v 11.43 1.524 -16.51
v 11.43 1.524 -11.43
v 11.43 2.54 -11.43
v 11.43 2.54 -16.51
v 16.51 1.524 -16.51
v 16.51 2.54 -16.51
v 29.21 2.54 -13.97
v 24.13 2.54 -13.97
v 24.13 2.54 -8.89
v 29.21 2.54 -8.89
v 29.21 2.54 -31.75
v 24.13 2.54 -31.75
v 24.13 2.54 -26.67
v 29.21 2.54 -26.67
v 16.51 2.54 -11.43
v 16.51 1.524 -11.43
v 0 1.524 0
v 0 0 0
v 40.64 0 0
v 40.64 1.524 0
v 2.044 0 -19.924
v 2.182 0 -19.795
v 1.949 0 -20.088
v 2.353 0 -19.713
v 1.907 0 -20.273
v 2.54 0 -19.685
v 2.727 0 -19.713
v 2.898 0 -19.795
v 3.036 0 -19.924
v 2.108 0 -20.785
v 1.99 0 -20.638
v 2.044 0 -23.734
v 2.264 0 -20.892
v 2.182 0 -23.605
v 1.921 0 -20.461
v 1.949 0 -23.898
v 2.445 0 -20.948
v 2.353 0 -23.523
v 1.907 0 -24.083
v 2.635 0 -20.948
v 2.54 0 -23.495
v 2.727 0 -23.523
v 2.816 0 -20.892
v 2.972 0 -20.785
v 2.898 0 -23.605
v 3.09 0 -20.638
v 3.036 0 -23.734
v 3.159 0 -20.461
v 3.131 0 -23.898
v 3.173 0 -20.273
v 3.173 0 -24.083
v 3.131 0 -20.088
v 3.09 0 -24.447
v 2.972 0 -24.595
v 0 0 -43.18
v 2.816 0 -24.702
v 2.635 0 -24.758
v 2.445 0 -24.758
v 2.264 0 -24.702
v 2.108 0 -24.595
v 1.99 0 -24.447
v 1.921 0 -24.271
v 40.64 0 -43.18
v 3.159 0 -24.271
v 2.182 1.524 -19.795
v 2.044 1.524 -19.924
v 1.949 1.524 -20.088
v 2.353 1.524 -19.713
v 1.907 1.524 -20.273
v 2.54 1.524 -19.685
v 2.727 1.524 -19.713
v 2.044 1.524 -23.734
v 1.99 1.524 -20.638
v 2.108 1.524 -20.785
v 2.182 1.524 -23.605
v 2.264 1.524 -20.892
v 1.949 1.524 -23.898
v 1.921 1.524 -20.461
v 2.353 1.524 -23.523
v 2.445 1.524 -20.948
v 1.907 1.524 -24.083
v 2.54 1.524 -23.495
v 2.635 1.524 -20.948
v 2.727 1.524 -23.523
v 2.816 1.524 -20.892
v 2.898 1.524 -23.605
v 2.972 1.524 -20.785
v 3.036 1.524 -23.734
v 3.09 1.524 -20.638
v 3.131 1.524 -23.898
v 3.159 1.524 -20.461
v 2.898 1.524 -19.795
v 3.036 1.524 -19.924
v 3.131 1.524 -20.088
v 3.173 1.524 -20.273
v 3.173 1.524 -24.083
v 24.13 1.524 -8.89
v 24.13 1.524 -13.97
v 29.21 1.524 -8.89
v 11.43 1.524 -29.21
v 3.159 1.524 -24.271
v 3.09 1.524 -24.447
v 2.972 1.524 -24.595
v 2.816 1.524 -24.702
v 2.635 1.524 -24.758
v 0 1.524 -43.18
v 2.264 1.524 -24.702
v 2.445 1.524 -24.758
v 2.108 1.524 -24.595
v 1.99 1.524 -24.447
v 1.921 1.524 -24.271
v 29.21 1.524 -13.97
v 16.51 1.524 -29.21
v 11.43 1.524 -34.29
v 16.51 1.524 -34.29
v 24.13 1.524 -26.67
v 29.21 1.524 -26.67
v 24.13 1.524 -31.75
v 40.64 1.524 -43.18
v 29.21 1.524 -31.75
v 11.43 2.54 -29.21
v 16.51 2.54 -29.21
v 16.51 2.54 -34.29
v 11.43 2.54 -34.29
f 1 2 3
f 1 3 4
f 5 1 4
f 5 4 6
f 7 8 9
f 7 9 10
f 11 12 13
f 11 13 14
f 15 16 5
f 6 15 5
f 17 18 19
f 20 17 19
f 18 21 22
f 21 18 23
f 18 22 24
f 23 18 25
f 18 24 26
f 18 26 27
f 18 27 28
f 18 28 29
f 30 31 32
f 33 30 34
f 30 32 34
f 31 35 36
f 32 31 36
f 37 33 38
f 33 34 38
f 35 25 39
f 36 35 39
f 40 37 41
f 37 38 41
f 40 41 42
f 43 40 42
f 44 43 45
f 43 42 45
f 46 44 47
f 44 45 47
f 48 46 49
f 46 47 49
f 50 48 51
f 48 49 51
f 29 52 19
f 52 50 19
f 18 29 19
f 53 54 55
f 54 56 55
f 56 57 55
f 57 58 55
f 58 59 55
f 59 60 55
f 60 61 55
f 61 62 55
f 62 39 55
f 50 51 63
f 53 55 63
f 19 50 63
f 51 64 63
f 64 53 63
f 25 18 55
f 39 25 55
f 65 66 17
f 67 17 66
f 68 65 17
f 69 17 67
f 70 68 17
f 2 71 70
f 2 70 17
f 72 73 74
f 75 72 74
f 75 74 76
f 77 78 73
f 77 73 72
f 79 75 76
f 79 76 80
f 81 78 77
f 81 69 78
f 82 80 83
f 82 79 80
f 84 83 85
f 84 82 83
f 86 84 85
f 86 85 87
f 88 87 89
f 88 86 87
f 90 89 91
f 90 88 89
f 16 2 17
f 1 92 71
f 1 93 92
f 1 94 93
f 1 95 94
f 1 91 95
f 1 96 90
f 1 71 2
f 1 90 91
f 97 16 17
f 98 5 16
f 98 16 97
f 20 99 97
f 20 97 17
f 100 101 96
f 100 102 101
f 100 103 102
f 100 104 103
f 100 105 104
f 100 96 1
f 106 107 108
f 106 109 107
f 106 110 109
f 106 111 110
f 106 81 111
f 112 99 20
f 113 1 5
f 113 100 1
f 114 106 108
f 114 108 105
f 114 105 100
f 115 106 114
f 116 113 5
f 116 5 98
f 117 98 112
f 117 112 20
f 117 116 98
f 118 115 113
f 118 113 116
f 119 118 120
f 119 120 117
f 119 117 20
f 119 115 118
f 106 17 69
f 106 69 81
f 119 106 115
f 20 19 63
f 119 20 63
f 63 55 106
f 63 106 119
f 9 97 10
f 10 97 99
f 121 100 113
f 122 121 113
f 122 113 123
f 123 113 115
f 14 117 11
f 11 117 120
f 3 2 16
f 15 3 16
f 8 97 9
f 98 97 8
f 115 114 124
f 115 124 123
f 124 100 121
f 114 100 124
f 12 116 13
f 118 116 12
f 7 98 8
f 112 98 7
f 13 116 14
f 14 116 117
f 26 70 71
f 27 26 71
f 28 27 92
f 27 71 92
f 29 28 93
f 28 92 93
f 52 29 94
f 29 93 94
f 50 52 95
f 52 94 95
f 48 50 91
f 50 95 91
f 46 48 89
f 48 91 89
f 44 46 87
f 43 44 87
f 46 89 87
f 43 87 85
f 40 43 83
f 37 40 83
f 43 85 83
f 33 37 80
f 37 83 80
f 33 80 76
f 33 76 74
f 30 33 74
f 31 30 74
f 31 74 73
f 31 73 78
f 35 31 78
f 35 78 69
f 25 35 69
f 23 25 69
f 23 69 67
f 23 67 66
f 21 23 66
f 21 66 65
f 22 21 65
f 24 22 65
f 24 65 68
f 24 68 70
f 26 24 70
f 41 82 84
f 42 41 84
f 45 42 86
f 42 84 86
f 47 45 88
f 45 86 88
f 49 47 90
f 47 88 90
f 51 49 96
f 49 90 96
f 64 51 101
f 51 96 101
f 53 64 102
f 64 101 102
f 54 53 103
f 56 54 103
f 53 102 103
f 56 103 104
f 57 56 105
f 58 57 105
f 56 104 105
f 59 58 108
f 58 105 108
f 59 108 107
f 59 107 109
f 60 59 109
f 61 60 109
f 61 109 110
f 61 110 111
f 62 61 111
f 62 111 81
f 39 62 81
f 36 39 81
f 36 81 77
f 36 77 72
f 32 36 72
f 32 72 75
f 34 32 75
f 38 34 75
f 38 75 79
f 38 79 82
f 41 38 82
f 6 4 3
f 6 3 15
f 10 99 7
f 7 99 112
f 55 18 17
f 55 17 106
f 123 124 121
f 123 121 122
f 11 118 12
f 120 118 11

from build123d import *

# Parameters (mm, degrees)
SKETCH2_W           = 40.64
SKETCH2_H           = 43.18
BOSS_EXTRUDE1_DEPTH = 1.524
SKETCH3_R           = 0.635
CUT_EXTRUDE1_DEPTH  = 60.316478115
SKETCH4_W           = 5.08
SKETCH4_H           = 5.08
BOSS_EXTRUDE2_DEPTH = 1.016


with BuildPart() as part:
    # Sketch2 → Boss-Extrude1 (new body)
    with BuildSketch(Plane(origin=(0, 0, 0), x_dir=(1, 0, 0), z_dir=(0, 1, 0))):
        with Locations((20.32, 21.59)):
            Rectangle(SKETCH2_W, SKETCH2_H)
    extrude(amount=BOSS_EXTRUDE1_DEPTH)

    # Sketch3 → Cut-Extrude1 (cut, through all)
    with BuildSketch(Plane(origin=(0, 1.524, 0), x_dir=(1, 0, 0), z_dir=(0, 1, 0))):
        with Locations(Location((2.54, 24.13, 0), (0, 0, 270))):
            Circle(SKETCH3_R)
        with Locations(Location((2.54, 20.32, 0), (0, 0, 270))):
            Circle(SKETCH3_R)
    extrude(amount=-CUT_EXTRUDE1_DEPTH, mode=Mode.SUBTRACT)

    # Sketch4 → Boss-Extrude2 (add)
    with BuildSketch(Plane(origin=(0, 1.524, 0), x_dir=(1, 0, 0), z_dir=(0, 1, 0))):
        with Locations((13.97, 31.75)):
            Rectangle(SKETCH4_W, SKETCH4_H)
        with Locations((26.67, 29.21)):
            Rectangle(SKETCH4_W, SKETCH4_H)
        with Locations((13.97, 13.97)):
            Rectangle(SKETCH4_W, SKETCH4_H)
        with Locations((26.67, 11.43)):
            Rectangle(SKETCH4_W, SKETCH4_H)
    extrude(amount=BOSS_EXTRUDE2_DEPTH)


solid = part.part
